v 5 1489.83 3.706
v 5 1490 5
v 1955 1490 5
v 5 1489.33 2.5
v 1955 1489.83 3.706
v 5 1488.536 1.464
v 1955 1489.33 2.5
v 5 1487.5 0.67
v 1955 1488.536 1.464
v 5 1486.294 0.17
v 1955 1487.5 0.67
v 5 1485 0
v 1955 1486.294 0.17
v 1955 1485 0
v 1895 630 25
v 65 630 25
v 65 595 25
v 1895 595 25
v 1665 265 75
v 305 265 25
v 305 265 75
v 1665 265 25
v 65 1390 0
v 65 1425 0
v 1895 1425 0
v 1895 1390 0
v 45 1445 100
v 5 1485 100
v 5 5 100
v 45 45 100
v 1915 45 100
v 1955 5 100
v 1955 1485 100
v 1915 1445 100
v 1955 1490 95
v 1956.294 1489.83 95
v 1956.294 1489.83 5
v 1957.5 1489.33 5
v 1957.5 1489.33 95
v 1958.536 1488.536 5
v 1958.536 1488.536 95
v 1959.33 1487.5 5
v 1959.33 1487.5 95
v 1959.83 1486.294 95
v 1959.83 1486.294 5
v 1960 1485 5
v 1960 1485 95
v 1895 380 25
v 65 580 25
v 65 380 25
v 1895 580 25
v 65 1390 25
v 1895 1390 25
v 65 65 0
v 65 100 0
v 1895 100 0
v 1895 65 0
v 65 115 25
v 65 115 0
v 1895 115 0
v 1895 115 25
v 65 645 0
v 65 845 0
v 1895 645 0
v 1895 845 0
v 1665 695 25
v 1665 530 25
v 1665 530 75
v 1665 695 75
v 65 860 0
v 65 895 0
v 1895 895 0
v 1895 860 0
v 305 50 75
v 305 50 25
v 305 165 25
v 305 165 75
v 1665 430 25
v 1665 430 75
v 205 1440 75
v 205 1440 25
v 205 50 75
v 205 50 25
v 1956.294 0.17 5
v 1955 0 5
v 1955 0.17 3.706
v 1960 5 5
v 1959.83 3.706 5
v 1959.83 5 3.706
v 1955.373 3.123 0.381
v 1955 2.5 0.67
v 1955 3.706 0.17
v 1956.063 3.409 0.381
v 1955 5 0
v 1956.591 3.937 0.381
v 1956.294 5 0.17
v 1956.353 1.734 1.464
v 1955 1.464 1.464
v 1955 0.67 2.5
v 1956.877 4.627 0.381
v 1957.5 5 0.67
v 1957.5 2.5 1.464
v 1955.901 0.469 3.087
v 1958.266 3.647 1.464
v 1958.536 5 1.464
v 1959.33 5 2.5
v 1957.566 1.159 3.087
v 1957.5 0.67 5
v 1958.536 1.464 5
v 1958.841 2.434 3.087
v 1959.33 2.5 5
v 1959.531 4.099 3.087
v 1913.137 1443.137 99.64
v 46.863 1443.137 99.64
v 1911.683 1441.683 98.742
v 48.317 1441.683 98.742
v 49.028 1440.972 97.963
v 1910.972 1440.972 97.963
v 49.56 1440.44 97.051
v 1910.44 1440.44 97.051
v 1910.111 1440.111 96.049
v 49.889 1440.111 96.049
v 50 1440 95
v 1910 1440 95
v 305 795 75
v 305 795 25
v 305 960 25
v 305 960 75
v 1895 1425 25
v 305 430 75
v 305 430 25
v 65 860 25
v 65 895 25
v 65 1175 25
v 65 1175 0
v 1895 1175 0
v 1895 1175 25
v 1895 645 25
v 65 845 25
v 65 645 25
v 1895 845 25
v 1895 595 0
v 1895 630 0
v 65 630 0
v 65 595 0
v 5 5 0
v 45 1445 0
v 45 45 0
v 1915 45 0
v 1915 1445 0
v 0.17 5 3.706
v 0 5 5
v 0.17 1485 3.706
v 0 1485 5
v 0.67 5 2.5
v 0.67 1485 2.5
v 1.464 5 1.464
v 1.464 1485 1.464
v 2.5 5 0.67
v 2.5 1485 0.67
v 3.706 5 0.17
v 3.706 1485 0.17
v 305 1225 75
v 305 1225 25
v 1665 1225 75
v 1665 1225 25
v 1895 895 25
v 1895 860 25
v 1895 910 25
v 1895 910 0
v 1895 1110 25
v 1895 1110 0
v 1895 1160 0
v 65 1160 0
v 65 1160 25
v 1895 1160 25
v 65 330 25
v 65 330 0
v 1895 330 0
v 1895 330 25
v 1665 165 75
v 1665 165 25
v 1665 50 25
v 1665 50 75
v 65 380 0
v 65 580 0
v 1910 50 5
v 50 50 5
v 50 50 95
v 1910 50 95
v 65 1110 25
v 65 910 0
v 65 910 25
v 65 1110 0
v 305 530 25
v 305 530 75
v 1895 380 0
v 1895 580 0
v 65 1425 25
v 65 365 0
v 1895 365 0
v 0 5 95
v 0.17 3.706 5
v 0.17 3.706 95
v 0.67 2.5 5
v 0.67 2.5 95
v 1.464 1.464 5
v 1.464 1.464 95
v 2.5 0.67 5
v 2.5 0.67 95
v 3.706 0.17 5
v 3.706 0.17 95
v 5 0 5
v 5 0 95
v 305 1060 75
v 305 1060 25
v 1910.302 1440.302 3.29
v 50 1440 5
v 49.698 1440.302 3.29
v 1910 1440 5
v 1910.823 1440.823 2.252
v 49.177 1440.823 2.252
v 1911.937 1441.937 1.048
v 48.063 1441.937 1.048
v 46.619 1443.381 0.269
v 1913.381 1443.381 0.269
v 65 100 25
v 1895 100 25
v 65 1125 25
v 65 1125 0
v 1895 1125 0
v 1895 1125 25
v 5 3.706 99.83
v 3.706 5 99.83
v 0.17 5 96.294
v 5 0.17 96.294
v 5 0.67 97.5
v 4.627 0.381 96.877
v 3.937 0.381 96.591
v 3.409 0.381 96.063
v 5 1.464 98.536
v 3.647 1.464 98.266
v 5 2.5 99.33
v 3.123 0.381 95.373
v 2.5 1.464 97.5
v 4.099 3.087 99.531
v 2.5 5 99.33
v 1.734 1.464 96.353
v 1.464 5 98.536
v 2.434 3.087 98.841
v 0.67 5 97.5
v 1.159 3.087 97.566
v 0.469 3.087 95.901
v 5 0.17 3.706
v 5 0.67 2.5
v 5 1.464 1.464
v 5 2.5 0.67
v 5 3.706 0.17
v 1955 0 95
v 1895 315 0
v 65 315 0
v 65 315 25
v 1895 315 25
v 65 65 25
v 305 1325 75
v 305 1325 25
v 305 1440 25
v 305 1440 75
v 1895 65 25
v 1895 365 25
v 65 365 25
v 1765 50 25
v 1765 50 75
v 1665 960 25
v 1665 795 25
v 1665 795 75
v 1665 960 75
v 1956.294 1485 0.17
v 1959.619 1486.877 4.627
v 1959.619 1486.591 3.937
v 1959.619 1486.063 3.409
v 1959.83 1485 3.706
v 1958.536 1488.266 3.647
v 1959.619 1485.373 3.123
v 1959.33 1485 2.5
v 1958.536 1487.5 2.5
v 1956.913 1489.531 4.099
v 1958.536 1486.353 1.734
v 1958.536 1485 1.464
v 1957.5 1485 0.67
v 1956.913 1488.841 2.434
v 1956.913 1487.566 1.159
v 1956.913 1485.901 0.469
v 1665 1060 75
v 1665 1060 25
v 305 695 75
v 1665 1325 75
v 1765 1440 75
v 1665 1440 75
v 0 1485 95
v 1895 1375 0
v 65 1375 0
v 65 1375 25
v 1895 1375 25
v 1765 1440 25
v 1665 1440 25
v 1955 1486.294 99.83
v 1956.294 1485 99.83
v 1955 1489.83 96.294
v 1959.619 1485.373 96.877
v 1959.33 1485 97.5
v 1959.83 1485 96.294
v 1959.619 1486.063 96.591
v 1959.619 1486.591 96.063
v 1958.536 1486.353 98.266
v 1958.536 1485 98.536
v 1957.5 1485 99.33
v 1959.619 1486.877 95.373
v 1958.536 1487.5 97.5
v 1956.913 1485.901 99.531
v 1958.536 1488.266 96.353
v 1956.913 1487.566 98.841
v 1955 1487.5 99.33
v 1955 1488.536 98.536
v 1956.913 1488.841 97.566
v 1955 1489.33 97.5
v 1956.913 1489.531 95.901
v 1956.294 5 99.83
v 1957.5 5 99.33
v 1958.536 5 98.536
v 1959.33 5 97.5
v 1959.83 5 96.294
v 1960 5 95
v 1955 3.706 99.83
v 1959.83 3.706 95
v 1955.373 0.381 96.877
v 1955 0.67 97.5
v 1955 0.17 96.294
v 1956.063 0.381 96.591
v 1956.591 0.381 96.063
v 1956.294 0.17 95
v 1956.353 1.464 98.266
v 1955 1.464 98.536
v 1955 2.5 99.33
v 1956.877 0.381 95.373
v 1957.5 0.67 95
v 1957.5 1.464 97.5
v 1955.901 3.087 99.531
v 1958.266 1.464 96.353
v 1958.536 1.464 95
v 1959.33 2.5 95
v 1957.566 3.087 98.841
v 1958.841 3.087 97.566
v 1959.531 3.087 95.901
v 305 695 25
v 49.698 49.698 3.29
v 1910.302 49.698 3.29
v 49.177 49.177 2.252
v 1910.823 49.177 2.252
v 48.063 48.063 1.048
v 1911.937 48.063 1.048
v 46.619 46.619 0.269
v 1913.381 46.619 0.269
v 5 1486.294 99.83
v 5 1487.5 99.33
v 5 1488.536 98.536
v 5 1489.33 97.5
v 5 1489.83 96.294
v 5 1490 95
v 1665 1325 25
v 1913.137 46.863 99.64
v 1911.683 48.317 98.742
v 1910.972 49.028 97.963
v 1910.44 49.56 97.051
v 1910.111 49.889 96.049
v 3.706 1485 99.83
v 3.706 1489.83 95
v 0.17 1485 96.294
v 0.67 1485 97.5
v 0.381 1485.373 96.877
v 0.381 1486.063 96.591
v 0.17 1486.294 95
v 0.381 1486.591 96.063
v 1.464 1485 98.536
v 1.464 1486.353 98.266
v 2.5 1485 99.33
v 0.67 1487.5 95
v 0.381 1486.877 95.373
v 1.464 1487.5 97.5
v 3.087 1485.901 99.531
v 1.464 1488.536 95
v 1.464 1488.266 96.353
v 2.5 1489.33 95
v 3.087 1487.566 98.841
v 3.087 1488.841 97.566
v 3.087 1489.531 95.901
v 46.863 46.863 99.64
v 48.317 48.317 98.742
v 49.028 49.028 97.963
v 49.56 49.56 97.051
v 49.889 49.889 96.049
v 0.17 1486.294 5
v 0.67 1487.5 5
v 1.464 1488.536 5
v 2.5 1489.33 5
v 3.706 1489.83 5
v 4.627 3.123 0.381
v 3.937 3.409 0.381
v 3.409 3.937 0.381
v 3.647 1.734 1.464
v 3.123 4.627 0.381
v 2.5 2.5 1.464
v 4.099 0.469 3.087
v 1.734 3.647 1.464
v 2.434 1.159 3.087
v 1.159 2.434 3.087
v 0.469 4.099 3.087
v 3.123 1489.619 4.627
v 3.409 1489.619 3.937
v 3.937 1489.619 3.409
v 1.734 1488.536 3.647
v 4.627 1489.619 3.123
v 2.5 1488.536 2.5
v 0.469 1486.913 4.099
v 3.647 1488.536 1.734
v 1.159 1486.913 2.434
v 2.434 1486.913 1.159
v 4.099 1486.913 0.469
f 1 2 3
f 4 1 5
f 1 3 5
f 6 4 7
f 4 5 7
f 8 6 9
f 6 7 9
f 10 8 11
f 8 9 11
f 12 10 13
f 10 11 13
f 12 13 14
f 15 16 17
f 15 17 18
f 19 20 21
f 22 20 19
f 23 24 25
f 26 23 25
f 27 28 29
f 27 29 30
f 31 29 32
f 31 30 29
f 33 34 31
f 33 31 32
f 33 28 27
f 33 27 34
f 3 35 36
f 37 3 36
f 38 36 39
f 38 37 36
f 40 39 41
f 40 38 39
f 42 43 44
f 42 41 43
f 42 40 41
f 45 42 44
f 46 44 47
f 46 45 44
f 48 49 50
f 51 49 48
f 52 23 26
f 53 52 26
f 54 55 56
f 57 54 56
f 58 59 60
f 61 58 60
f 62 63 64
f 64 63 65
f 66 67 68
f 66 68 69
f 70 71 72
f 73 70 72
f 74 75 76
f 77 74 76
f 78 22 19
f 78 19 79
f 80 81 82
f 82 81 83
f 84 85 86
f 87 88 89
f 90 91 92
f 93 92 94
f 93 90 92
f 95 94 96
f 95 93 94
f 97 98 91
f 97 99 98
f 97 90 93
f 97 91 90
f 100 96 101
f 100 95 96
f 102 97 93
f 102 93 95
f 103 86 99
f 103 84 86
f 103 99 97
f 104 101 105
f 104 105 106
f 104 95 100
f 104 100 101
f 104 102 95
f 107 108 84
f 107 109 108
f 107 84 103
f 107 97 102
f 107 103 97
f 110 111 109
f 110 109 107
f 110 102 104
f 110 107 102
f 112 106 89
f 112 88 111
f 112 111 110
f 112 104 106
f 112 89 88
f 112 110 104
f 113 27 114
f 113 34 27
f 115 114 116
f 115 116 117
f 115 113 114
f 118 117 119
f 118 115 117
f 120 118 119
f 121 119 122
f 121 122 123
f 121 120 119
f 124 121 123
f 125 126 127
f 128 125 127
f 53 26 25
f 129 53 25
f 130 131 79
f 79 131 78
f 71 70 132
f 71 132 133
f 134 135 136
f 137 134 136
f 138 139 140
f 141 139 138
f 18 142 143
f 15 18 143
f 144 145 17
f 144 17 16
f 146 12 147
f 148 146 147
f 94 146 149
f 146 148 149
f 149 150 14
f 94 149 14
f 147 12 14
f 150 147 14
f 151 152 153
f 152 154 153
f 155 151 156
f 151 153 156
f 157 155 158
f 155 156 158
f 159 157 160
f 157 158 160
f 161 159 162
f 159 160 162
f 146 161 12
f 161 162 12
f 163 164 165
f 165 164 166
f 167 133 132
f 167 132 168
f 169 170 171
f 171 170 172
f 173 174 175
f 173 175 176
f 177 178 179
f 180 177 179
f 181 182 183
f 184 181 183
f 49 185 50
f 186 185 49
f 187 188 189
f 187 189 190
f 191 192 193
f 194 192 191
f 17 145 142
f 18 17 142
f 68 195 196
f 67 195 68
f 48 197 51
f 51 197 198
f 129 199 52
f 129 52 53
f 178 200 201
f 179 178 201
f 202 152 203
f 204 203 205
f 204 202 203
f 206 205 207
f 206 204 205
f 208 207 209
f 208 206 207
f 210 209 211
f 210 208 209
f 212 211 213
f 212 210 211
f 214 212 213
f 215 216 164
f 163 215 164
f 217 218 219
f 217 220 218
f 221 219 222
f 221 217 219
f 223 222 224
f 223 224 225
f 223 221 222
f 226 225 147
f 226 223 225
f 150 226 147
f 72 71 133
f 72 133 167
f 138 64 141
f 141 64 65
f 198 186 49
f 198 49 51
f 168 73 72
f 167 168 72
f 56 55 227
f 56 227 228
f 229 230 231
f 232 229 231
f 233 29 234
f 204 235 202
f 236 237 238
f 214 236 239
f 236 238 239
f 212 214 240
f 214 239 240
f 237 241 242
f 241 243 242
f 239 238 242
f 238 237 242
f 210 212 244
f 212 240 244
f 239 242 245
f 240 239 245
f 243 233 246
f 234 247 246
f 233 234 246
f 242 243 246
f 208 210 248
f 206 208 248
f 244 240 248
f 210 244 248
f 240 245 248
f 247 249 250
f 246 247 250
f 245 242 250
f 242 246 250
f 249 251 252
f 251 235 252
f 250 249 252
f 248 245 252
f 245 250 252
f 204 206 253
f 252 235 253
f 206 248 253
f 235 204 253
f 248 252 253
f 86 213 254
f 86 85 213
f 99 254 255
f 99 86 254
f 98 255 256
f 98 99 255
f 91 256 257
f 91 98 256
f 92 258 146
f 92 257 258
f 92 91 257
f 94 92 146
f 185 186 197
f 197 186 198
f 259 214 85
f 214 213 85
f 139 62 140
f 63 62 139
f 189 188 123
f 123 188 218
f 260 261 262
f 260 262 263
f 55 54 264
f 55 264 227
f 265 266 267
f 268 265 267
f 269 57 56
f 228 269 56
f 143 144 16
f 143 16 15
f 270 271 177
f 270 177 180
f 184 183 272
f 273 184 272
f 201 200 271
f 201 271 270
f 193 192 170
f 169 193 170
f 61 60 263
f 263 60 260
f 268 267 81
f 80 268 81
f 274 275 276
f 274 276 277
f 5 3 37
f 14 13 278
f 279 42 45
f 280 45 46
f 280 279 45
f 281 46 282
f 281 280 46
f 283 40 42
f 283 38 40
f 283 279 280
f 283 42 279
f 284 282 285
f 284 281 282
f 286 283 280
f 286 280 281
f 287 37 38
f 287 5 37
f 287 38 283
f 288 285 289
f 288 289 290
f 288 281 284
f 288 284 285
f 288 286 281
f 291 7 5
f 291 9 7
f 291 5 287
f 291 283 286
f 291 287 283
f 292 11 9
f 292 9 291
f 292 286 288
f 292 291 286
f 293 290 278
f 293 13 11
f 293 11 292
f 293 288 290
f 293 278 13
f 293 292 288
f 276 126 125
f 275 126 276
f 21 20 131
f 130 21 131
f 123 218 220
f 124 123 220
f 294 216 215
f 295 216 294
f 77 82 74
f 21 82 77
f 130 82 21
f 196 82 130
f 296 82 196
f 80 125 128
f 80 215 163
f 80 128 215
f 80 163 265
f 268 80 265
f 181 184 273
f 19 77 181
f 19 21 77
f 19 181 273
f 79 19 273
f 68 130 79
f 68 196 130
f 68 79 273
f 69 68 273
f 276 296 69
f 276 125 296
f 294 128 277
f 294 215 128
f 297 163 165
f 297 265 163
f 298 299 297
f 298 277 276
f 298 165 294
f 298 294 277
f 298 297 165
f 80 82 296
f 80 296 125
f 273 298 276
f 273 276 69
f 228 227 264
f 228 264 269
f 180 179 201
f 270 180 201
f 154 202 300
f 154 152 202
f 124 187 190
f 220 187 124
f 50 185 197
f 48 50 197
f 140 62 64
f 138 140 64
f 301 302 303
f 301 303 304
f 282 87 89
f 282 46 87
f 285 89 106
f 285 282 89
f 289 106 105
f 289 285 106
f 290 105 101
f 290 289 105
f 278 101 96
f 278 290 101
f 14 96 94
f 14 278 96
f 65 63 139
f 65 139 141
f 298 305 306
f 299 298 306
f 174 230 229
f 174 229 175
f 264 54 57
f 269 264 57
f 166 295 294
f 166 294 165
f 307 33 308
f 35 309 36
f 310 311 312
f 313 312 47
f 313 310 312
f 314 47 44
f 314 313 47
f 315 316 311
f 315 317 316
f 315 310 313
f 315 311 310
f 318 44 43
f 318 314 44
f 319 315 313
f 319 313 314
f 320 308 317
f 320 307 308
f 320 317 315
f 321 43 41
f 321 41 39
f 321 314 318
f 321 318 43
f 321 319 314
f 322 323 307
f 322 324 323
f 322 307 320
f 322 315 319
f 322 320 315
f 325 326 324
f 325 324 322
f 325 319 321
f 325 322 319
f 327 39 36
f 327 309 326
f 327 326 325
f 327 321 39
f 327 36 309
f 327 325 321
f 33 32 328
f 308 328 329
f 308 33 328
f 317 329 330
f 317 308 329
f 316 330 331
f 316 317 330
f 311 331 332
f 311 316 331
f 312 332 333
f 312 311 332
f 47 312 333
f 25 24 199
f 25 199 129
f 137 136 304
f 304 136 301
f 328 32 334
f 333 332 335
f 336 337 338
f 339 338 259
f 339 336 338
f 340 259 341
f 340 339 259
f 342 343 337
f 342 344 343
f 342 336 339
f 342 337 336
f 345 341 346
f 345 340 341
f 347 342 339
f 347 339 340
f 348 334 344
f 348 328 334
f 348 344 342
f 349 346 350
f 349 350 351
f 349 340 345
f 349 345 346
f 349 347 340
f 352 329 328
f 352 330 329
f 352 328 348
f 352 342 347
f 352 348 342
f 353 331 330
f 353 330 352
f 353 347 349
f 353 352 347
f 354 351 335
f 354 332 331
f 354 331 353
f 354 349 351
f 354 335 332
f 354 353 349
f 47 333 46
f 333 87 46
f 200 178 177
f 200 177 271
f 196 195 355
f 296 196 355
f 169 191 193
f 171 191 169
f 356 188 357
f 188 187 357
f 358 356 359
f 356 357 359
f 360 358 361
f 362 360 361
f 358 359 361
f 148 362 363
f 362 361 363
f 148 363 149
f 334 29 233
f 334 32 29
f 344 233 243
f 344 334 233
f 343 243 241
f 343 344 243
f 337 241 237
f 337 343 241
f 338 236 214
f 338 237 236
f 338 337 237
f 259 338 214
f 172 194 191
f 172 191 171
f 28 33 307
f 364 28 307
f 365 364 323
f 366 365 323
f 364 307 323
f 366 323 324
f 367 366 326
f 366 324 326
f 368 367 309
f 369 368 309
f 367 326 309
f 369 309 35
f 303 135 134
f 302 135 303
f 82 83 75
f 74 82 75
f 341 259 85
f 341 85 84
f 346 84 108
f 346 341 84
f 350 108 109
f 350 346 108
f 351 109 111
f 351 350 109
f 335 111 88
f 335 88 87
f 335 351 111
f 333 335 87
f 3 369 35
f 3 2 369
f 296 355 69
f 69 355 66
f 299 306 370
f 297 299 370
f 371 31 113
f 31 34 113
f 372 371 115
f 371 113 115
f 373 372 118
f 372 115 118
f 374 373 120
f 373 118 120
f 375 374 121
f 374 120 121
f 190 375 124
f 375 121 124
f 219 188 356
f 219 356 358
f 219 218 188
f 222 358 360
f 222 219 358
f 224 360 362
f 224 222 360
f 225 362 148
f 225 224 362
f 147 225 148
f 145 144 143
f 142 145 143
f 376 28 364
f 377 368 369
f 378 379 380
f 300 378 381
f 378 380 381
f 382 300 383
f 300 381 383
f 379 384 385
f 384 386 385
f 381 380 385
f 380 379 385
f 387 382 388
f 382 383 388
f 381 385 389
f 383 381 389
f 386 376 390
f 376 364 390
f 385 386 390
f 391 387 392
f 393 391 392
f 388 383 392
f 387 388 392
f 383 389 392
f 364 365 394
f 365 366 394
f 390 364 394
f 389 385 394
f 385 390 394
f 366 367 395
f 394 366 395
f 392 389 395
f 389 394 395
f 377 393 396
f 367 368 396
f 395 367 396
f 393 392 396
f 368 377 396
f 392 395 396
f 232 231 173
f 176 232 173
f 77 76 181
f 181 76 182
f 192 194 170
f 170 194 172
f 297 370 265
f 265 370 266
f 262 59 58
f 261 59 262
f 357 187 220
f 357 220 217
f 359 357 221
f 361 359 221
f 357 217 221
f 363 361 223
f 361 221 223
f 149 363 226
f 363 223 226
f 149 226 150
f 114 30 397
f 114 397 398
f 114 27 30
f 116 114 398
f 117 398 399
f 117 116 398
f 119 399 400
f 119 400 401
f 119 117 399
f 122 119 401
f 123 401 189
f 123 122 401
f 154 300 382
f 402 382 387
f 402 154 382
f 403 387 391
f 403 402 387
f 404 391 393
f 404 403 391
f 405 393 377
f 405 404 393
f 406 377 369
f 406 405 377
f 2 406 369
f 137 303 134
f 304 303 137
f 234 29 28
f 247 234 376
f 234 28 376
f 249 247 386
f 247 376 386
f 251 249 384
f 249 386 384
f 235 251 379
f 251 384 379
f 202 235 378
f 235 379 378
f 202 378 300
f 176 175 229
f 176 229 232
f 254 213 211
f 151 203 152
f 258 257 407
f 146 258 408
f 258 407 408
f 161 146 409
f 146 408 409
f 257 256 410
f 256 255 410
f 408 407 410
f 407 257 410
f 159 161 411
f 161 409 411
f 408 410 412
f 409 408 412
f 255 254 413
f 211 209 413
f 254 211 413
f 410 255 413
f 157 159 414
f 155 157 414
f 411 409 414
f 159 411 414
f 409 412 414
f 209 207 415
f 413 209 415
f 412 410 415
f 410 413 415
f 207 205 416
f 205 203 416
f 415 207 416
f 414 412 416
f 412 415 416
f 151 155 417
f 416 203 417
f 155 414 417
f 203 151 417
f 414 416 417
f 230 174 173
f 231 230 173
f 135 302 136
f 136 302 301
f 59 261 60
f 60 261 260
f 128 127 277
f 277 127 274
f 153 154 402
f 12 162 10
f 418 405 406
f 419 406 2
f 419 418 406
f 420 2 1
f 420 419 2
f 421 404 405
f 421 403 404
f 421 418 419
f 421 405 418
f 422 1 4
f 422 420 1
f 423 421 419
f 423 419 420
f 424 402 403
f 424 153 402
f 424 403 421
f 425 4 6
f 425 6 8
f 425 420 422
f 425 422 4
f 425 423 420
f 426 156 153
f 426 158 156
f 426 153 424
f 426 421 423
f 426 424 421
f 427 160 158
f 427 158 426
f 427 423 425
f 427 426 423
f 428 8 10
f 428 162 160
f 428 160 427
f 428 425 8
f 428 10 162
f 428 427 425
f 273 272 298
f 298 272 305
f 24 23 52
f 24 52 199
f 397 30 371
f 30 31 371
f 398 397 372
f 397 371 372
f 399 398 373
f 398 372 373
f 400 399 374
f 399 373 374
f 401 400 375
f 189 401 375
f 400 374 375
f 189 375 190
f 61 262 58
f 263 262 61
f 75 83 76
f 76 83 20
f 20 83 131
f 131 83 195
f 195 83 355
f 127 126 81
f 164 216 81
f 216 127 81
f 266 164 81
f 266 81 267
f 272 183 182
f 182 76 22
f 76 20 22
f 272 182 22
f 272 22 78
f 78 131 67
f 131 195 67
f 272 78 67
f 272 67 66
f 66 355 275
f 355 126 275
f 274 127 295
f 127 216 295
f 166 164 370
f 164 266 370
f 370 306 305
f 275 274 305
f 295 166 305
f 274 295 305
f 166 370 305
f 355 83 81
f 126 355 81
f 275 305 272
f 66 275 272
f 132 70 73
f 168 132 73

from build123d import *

# Parameters (mm, degrees)
F0_W     = 1960
F0_H     = 1490
F0_W_2   = 1860
F0_H_2   = 1390
F1_DEPTH = 100
F2_DEPTH = 25
F0_W_3   = 1830
F0_H_3   = 200
F0_H_4   = 35
F3_R     = 5
F4_R     = 5
F5_W     = 1360
F5_H     = 165
F6_DEPTH = 50


# Not quite as in the source:
# - a feature names something its author has since deleted; it is built from what else it names


with BuildPart() as f1:
    # F0 (on Top) → F1 (new body)
    with BuildSketch(Plane.XY):
        with Locations((980, 745)):
            Rectangle(F0_W, F0_H)
        with Locations((980, 745)):
            Rectangle(F0_W_2, F0_H_2, mode=Mode.SUBTRACT)
    extrude(amount=F1_DEPTH)

    # F0 (on Top) → F2 (join)
    with BuildSketch(Plane.XY):
        with Locations((980, 745)):
            Rectangle(F0_W, F0_H)
        with Locations((980, 745)):
            Rectangle(F0_W_2, F0_H_2, mode=Mode.SUBTRACT)
    extrude(amount=F2_DEPTH)

    # F3
    f3_edges = [f1.edges().sort_by_distance(p)[0] for p in [
        (980, 1440, 100),
        (50, 745, 100),
        (980, 50, 100),
        (1910, 745, 100),
    ]]
    fillet(f3_edges, radius=F3_R)

    # F4
    f4_edges = [f1.edges().sort_by_distance(p)[0] for p in [
        (980, 1490, 100),
        (0, 745, 100),
        (1960, 745, 100),
        (980, 0, 100),
        (1960, 0, 50),
        (0, 0, 50),
        (980, 0, 0),
        (0, 745, 0),
        (0, 1490, 50),
        (980, 1490, 0),
        (1960, 1490, 50),
        (1960, 745, 0),
        (50, 745, 0),
        (980, 1440, 0),
        (980, 50, 0),
        (1910, 745, 0),
    ]]
    fillet(f4_edges, radius=F4_R)


with BuildPart() as f2:
    # F0 (on Top) → F2, piece 2 (new body)
    with BuildSketch(Plane.XY):
        with Locations((980, 1275)):
            Rectangle(F0_W_3, F0_H_3)
    extrude(amount=F2_DEPTH)


with BuildPart() as f2b:
    # F0 (on Top) → F2, piece 3 (new body)
    with BuildSketch(Plane.XY):
        with Locations((980, 1010)):
            Rectangle(F0_W_3, F0_H_3)
    extrude(amount=F2_DEPTH)


with BuildPart() as f2c:
    # F0 (on Top) → F2, piece 4 (new body)
    with BuildSketch(Plane.XY):
        with Locations((980, 745)):
            Rectangle(F0_W_3, F0_H_3)
    extrude(amount=F2_DEPTH)


with BuildPart() as f2d:
    # F0 (on Top) → F2, piece 5 (new body)
    with BuildSketch(Plane.XY):
        with Locations((980, 480)):
            Rectangle(F0_W_3, F0_H_3)
    extrude(amount=F2_DEPTH)


with BuildPart() as f2e:
    # F0 (on Top) → F2, piece 6 (new body)
    with BuildSketch(Plane.XY):
        with Locations((980, 215)):
            Rectangle(F0_W_3, F0_H_3)
    extrude(amount=F2_DEPTH)


with BuildPart() as f2f:
    # F0 (on Top) → F2, piece 7 (new body)
    with BuildSketch(Plane.XY):
        with Locations((980, 82.5)):
            Rectangle(F0_W_3, F0_H_4)
    extrude(amount=F2_DEPTH)


with BuildPart() as f2g:
    # F0 (on Top) → F2, piece 8 (new body)
    with BuildSketch(Plane.XY):
        with Locations((980, 347.5)):
            Rectangle(F0_W_3, F0_H_4)
    extrude(amount=F2_DEPTH)


with BuildPart() as f2h:
    # F0 (on Top) → F2, piece 9 (new body)
    with BuildSketch(Plane.XY):
        with Locations((980, 612.5)):
            Rectangle(F0_W_3, F0_H_4)
    extrude(amount=F2_DEPTH)


with BuildPart() as f2i:
    # F0 (on Top) → F2, piece 10 (new body)
    with BuildSketch(Plane.XY):
        with Locations((980, 877.5)):
            Rectangle(F0_W_3, F0_H_4)
    extrude(amount=F2_DEPTH)


with BuildPart() as f2j:
    # F0 (on Top) → F2, piece 11 (new body)
    with BuildSketch(Plane.XY):
        with Locations((980, 1142.5)):
            Rectangle(F0_W_3, F0_H_4)
    extrude(amount=F2_DEPTH)


with BuildPart() as f2k:
    # F0 (on Top) → F2, piece 12 (new body)
    with BuildSketch(Plane.XY):
        with Locations((980, 1407.5)):
            Rectangle(F0_W_3, F0_H_4)
    extrude(amount=F2_DEPTH)


with BuildPart() as f6:
    # F5 (on face) → F6 (new body)
    with BuildSketch(Plane.XY.offset(25)):
        Polygon((205, 1440), (205, 50), (305, 50), (305, 165), (1665, 165), (1665, 50), (1765, 50), (1765, 1440), (1665, 1440), (1665, 1325), (305, 1325), (305, 1440), align=None)
        with Locations((985, 347.5)):
            Rectangle(F5_W, F5_H, mode=Mode.SUBTRACT)
        with Locations((985, 612.5)):
            Rectangle(F5_W, F5_H, mode=Mode.SUBTRACT)
        with Locations((985, 877.5)):
            Rectangle(F5_W, F5_H, mode=Mode.SUBTRACT)
        with Locations((985, 1142.5)):
            Rectangle(F5_W, F5_H, mode=Mode.SUBTRACT)
    extrude(amount=F6_DEPTH)


solid = Compound([f1.part, f2.part, f2b.part, f2c.part, f2d.part, f2e.part, f2f.part, f2g.part, f2h.part, f2i.part, f2j.part, f2k.part, f6.part])
